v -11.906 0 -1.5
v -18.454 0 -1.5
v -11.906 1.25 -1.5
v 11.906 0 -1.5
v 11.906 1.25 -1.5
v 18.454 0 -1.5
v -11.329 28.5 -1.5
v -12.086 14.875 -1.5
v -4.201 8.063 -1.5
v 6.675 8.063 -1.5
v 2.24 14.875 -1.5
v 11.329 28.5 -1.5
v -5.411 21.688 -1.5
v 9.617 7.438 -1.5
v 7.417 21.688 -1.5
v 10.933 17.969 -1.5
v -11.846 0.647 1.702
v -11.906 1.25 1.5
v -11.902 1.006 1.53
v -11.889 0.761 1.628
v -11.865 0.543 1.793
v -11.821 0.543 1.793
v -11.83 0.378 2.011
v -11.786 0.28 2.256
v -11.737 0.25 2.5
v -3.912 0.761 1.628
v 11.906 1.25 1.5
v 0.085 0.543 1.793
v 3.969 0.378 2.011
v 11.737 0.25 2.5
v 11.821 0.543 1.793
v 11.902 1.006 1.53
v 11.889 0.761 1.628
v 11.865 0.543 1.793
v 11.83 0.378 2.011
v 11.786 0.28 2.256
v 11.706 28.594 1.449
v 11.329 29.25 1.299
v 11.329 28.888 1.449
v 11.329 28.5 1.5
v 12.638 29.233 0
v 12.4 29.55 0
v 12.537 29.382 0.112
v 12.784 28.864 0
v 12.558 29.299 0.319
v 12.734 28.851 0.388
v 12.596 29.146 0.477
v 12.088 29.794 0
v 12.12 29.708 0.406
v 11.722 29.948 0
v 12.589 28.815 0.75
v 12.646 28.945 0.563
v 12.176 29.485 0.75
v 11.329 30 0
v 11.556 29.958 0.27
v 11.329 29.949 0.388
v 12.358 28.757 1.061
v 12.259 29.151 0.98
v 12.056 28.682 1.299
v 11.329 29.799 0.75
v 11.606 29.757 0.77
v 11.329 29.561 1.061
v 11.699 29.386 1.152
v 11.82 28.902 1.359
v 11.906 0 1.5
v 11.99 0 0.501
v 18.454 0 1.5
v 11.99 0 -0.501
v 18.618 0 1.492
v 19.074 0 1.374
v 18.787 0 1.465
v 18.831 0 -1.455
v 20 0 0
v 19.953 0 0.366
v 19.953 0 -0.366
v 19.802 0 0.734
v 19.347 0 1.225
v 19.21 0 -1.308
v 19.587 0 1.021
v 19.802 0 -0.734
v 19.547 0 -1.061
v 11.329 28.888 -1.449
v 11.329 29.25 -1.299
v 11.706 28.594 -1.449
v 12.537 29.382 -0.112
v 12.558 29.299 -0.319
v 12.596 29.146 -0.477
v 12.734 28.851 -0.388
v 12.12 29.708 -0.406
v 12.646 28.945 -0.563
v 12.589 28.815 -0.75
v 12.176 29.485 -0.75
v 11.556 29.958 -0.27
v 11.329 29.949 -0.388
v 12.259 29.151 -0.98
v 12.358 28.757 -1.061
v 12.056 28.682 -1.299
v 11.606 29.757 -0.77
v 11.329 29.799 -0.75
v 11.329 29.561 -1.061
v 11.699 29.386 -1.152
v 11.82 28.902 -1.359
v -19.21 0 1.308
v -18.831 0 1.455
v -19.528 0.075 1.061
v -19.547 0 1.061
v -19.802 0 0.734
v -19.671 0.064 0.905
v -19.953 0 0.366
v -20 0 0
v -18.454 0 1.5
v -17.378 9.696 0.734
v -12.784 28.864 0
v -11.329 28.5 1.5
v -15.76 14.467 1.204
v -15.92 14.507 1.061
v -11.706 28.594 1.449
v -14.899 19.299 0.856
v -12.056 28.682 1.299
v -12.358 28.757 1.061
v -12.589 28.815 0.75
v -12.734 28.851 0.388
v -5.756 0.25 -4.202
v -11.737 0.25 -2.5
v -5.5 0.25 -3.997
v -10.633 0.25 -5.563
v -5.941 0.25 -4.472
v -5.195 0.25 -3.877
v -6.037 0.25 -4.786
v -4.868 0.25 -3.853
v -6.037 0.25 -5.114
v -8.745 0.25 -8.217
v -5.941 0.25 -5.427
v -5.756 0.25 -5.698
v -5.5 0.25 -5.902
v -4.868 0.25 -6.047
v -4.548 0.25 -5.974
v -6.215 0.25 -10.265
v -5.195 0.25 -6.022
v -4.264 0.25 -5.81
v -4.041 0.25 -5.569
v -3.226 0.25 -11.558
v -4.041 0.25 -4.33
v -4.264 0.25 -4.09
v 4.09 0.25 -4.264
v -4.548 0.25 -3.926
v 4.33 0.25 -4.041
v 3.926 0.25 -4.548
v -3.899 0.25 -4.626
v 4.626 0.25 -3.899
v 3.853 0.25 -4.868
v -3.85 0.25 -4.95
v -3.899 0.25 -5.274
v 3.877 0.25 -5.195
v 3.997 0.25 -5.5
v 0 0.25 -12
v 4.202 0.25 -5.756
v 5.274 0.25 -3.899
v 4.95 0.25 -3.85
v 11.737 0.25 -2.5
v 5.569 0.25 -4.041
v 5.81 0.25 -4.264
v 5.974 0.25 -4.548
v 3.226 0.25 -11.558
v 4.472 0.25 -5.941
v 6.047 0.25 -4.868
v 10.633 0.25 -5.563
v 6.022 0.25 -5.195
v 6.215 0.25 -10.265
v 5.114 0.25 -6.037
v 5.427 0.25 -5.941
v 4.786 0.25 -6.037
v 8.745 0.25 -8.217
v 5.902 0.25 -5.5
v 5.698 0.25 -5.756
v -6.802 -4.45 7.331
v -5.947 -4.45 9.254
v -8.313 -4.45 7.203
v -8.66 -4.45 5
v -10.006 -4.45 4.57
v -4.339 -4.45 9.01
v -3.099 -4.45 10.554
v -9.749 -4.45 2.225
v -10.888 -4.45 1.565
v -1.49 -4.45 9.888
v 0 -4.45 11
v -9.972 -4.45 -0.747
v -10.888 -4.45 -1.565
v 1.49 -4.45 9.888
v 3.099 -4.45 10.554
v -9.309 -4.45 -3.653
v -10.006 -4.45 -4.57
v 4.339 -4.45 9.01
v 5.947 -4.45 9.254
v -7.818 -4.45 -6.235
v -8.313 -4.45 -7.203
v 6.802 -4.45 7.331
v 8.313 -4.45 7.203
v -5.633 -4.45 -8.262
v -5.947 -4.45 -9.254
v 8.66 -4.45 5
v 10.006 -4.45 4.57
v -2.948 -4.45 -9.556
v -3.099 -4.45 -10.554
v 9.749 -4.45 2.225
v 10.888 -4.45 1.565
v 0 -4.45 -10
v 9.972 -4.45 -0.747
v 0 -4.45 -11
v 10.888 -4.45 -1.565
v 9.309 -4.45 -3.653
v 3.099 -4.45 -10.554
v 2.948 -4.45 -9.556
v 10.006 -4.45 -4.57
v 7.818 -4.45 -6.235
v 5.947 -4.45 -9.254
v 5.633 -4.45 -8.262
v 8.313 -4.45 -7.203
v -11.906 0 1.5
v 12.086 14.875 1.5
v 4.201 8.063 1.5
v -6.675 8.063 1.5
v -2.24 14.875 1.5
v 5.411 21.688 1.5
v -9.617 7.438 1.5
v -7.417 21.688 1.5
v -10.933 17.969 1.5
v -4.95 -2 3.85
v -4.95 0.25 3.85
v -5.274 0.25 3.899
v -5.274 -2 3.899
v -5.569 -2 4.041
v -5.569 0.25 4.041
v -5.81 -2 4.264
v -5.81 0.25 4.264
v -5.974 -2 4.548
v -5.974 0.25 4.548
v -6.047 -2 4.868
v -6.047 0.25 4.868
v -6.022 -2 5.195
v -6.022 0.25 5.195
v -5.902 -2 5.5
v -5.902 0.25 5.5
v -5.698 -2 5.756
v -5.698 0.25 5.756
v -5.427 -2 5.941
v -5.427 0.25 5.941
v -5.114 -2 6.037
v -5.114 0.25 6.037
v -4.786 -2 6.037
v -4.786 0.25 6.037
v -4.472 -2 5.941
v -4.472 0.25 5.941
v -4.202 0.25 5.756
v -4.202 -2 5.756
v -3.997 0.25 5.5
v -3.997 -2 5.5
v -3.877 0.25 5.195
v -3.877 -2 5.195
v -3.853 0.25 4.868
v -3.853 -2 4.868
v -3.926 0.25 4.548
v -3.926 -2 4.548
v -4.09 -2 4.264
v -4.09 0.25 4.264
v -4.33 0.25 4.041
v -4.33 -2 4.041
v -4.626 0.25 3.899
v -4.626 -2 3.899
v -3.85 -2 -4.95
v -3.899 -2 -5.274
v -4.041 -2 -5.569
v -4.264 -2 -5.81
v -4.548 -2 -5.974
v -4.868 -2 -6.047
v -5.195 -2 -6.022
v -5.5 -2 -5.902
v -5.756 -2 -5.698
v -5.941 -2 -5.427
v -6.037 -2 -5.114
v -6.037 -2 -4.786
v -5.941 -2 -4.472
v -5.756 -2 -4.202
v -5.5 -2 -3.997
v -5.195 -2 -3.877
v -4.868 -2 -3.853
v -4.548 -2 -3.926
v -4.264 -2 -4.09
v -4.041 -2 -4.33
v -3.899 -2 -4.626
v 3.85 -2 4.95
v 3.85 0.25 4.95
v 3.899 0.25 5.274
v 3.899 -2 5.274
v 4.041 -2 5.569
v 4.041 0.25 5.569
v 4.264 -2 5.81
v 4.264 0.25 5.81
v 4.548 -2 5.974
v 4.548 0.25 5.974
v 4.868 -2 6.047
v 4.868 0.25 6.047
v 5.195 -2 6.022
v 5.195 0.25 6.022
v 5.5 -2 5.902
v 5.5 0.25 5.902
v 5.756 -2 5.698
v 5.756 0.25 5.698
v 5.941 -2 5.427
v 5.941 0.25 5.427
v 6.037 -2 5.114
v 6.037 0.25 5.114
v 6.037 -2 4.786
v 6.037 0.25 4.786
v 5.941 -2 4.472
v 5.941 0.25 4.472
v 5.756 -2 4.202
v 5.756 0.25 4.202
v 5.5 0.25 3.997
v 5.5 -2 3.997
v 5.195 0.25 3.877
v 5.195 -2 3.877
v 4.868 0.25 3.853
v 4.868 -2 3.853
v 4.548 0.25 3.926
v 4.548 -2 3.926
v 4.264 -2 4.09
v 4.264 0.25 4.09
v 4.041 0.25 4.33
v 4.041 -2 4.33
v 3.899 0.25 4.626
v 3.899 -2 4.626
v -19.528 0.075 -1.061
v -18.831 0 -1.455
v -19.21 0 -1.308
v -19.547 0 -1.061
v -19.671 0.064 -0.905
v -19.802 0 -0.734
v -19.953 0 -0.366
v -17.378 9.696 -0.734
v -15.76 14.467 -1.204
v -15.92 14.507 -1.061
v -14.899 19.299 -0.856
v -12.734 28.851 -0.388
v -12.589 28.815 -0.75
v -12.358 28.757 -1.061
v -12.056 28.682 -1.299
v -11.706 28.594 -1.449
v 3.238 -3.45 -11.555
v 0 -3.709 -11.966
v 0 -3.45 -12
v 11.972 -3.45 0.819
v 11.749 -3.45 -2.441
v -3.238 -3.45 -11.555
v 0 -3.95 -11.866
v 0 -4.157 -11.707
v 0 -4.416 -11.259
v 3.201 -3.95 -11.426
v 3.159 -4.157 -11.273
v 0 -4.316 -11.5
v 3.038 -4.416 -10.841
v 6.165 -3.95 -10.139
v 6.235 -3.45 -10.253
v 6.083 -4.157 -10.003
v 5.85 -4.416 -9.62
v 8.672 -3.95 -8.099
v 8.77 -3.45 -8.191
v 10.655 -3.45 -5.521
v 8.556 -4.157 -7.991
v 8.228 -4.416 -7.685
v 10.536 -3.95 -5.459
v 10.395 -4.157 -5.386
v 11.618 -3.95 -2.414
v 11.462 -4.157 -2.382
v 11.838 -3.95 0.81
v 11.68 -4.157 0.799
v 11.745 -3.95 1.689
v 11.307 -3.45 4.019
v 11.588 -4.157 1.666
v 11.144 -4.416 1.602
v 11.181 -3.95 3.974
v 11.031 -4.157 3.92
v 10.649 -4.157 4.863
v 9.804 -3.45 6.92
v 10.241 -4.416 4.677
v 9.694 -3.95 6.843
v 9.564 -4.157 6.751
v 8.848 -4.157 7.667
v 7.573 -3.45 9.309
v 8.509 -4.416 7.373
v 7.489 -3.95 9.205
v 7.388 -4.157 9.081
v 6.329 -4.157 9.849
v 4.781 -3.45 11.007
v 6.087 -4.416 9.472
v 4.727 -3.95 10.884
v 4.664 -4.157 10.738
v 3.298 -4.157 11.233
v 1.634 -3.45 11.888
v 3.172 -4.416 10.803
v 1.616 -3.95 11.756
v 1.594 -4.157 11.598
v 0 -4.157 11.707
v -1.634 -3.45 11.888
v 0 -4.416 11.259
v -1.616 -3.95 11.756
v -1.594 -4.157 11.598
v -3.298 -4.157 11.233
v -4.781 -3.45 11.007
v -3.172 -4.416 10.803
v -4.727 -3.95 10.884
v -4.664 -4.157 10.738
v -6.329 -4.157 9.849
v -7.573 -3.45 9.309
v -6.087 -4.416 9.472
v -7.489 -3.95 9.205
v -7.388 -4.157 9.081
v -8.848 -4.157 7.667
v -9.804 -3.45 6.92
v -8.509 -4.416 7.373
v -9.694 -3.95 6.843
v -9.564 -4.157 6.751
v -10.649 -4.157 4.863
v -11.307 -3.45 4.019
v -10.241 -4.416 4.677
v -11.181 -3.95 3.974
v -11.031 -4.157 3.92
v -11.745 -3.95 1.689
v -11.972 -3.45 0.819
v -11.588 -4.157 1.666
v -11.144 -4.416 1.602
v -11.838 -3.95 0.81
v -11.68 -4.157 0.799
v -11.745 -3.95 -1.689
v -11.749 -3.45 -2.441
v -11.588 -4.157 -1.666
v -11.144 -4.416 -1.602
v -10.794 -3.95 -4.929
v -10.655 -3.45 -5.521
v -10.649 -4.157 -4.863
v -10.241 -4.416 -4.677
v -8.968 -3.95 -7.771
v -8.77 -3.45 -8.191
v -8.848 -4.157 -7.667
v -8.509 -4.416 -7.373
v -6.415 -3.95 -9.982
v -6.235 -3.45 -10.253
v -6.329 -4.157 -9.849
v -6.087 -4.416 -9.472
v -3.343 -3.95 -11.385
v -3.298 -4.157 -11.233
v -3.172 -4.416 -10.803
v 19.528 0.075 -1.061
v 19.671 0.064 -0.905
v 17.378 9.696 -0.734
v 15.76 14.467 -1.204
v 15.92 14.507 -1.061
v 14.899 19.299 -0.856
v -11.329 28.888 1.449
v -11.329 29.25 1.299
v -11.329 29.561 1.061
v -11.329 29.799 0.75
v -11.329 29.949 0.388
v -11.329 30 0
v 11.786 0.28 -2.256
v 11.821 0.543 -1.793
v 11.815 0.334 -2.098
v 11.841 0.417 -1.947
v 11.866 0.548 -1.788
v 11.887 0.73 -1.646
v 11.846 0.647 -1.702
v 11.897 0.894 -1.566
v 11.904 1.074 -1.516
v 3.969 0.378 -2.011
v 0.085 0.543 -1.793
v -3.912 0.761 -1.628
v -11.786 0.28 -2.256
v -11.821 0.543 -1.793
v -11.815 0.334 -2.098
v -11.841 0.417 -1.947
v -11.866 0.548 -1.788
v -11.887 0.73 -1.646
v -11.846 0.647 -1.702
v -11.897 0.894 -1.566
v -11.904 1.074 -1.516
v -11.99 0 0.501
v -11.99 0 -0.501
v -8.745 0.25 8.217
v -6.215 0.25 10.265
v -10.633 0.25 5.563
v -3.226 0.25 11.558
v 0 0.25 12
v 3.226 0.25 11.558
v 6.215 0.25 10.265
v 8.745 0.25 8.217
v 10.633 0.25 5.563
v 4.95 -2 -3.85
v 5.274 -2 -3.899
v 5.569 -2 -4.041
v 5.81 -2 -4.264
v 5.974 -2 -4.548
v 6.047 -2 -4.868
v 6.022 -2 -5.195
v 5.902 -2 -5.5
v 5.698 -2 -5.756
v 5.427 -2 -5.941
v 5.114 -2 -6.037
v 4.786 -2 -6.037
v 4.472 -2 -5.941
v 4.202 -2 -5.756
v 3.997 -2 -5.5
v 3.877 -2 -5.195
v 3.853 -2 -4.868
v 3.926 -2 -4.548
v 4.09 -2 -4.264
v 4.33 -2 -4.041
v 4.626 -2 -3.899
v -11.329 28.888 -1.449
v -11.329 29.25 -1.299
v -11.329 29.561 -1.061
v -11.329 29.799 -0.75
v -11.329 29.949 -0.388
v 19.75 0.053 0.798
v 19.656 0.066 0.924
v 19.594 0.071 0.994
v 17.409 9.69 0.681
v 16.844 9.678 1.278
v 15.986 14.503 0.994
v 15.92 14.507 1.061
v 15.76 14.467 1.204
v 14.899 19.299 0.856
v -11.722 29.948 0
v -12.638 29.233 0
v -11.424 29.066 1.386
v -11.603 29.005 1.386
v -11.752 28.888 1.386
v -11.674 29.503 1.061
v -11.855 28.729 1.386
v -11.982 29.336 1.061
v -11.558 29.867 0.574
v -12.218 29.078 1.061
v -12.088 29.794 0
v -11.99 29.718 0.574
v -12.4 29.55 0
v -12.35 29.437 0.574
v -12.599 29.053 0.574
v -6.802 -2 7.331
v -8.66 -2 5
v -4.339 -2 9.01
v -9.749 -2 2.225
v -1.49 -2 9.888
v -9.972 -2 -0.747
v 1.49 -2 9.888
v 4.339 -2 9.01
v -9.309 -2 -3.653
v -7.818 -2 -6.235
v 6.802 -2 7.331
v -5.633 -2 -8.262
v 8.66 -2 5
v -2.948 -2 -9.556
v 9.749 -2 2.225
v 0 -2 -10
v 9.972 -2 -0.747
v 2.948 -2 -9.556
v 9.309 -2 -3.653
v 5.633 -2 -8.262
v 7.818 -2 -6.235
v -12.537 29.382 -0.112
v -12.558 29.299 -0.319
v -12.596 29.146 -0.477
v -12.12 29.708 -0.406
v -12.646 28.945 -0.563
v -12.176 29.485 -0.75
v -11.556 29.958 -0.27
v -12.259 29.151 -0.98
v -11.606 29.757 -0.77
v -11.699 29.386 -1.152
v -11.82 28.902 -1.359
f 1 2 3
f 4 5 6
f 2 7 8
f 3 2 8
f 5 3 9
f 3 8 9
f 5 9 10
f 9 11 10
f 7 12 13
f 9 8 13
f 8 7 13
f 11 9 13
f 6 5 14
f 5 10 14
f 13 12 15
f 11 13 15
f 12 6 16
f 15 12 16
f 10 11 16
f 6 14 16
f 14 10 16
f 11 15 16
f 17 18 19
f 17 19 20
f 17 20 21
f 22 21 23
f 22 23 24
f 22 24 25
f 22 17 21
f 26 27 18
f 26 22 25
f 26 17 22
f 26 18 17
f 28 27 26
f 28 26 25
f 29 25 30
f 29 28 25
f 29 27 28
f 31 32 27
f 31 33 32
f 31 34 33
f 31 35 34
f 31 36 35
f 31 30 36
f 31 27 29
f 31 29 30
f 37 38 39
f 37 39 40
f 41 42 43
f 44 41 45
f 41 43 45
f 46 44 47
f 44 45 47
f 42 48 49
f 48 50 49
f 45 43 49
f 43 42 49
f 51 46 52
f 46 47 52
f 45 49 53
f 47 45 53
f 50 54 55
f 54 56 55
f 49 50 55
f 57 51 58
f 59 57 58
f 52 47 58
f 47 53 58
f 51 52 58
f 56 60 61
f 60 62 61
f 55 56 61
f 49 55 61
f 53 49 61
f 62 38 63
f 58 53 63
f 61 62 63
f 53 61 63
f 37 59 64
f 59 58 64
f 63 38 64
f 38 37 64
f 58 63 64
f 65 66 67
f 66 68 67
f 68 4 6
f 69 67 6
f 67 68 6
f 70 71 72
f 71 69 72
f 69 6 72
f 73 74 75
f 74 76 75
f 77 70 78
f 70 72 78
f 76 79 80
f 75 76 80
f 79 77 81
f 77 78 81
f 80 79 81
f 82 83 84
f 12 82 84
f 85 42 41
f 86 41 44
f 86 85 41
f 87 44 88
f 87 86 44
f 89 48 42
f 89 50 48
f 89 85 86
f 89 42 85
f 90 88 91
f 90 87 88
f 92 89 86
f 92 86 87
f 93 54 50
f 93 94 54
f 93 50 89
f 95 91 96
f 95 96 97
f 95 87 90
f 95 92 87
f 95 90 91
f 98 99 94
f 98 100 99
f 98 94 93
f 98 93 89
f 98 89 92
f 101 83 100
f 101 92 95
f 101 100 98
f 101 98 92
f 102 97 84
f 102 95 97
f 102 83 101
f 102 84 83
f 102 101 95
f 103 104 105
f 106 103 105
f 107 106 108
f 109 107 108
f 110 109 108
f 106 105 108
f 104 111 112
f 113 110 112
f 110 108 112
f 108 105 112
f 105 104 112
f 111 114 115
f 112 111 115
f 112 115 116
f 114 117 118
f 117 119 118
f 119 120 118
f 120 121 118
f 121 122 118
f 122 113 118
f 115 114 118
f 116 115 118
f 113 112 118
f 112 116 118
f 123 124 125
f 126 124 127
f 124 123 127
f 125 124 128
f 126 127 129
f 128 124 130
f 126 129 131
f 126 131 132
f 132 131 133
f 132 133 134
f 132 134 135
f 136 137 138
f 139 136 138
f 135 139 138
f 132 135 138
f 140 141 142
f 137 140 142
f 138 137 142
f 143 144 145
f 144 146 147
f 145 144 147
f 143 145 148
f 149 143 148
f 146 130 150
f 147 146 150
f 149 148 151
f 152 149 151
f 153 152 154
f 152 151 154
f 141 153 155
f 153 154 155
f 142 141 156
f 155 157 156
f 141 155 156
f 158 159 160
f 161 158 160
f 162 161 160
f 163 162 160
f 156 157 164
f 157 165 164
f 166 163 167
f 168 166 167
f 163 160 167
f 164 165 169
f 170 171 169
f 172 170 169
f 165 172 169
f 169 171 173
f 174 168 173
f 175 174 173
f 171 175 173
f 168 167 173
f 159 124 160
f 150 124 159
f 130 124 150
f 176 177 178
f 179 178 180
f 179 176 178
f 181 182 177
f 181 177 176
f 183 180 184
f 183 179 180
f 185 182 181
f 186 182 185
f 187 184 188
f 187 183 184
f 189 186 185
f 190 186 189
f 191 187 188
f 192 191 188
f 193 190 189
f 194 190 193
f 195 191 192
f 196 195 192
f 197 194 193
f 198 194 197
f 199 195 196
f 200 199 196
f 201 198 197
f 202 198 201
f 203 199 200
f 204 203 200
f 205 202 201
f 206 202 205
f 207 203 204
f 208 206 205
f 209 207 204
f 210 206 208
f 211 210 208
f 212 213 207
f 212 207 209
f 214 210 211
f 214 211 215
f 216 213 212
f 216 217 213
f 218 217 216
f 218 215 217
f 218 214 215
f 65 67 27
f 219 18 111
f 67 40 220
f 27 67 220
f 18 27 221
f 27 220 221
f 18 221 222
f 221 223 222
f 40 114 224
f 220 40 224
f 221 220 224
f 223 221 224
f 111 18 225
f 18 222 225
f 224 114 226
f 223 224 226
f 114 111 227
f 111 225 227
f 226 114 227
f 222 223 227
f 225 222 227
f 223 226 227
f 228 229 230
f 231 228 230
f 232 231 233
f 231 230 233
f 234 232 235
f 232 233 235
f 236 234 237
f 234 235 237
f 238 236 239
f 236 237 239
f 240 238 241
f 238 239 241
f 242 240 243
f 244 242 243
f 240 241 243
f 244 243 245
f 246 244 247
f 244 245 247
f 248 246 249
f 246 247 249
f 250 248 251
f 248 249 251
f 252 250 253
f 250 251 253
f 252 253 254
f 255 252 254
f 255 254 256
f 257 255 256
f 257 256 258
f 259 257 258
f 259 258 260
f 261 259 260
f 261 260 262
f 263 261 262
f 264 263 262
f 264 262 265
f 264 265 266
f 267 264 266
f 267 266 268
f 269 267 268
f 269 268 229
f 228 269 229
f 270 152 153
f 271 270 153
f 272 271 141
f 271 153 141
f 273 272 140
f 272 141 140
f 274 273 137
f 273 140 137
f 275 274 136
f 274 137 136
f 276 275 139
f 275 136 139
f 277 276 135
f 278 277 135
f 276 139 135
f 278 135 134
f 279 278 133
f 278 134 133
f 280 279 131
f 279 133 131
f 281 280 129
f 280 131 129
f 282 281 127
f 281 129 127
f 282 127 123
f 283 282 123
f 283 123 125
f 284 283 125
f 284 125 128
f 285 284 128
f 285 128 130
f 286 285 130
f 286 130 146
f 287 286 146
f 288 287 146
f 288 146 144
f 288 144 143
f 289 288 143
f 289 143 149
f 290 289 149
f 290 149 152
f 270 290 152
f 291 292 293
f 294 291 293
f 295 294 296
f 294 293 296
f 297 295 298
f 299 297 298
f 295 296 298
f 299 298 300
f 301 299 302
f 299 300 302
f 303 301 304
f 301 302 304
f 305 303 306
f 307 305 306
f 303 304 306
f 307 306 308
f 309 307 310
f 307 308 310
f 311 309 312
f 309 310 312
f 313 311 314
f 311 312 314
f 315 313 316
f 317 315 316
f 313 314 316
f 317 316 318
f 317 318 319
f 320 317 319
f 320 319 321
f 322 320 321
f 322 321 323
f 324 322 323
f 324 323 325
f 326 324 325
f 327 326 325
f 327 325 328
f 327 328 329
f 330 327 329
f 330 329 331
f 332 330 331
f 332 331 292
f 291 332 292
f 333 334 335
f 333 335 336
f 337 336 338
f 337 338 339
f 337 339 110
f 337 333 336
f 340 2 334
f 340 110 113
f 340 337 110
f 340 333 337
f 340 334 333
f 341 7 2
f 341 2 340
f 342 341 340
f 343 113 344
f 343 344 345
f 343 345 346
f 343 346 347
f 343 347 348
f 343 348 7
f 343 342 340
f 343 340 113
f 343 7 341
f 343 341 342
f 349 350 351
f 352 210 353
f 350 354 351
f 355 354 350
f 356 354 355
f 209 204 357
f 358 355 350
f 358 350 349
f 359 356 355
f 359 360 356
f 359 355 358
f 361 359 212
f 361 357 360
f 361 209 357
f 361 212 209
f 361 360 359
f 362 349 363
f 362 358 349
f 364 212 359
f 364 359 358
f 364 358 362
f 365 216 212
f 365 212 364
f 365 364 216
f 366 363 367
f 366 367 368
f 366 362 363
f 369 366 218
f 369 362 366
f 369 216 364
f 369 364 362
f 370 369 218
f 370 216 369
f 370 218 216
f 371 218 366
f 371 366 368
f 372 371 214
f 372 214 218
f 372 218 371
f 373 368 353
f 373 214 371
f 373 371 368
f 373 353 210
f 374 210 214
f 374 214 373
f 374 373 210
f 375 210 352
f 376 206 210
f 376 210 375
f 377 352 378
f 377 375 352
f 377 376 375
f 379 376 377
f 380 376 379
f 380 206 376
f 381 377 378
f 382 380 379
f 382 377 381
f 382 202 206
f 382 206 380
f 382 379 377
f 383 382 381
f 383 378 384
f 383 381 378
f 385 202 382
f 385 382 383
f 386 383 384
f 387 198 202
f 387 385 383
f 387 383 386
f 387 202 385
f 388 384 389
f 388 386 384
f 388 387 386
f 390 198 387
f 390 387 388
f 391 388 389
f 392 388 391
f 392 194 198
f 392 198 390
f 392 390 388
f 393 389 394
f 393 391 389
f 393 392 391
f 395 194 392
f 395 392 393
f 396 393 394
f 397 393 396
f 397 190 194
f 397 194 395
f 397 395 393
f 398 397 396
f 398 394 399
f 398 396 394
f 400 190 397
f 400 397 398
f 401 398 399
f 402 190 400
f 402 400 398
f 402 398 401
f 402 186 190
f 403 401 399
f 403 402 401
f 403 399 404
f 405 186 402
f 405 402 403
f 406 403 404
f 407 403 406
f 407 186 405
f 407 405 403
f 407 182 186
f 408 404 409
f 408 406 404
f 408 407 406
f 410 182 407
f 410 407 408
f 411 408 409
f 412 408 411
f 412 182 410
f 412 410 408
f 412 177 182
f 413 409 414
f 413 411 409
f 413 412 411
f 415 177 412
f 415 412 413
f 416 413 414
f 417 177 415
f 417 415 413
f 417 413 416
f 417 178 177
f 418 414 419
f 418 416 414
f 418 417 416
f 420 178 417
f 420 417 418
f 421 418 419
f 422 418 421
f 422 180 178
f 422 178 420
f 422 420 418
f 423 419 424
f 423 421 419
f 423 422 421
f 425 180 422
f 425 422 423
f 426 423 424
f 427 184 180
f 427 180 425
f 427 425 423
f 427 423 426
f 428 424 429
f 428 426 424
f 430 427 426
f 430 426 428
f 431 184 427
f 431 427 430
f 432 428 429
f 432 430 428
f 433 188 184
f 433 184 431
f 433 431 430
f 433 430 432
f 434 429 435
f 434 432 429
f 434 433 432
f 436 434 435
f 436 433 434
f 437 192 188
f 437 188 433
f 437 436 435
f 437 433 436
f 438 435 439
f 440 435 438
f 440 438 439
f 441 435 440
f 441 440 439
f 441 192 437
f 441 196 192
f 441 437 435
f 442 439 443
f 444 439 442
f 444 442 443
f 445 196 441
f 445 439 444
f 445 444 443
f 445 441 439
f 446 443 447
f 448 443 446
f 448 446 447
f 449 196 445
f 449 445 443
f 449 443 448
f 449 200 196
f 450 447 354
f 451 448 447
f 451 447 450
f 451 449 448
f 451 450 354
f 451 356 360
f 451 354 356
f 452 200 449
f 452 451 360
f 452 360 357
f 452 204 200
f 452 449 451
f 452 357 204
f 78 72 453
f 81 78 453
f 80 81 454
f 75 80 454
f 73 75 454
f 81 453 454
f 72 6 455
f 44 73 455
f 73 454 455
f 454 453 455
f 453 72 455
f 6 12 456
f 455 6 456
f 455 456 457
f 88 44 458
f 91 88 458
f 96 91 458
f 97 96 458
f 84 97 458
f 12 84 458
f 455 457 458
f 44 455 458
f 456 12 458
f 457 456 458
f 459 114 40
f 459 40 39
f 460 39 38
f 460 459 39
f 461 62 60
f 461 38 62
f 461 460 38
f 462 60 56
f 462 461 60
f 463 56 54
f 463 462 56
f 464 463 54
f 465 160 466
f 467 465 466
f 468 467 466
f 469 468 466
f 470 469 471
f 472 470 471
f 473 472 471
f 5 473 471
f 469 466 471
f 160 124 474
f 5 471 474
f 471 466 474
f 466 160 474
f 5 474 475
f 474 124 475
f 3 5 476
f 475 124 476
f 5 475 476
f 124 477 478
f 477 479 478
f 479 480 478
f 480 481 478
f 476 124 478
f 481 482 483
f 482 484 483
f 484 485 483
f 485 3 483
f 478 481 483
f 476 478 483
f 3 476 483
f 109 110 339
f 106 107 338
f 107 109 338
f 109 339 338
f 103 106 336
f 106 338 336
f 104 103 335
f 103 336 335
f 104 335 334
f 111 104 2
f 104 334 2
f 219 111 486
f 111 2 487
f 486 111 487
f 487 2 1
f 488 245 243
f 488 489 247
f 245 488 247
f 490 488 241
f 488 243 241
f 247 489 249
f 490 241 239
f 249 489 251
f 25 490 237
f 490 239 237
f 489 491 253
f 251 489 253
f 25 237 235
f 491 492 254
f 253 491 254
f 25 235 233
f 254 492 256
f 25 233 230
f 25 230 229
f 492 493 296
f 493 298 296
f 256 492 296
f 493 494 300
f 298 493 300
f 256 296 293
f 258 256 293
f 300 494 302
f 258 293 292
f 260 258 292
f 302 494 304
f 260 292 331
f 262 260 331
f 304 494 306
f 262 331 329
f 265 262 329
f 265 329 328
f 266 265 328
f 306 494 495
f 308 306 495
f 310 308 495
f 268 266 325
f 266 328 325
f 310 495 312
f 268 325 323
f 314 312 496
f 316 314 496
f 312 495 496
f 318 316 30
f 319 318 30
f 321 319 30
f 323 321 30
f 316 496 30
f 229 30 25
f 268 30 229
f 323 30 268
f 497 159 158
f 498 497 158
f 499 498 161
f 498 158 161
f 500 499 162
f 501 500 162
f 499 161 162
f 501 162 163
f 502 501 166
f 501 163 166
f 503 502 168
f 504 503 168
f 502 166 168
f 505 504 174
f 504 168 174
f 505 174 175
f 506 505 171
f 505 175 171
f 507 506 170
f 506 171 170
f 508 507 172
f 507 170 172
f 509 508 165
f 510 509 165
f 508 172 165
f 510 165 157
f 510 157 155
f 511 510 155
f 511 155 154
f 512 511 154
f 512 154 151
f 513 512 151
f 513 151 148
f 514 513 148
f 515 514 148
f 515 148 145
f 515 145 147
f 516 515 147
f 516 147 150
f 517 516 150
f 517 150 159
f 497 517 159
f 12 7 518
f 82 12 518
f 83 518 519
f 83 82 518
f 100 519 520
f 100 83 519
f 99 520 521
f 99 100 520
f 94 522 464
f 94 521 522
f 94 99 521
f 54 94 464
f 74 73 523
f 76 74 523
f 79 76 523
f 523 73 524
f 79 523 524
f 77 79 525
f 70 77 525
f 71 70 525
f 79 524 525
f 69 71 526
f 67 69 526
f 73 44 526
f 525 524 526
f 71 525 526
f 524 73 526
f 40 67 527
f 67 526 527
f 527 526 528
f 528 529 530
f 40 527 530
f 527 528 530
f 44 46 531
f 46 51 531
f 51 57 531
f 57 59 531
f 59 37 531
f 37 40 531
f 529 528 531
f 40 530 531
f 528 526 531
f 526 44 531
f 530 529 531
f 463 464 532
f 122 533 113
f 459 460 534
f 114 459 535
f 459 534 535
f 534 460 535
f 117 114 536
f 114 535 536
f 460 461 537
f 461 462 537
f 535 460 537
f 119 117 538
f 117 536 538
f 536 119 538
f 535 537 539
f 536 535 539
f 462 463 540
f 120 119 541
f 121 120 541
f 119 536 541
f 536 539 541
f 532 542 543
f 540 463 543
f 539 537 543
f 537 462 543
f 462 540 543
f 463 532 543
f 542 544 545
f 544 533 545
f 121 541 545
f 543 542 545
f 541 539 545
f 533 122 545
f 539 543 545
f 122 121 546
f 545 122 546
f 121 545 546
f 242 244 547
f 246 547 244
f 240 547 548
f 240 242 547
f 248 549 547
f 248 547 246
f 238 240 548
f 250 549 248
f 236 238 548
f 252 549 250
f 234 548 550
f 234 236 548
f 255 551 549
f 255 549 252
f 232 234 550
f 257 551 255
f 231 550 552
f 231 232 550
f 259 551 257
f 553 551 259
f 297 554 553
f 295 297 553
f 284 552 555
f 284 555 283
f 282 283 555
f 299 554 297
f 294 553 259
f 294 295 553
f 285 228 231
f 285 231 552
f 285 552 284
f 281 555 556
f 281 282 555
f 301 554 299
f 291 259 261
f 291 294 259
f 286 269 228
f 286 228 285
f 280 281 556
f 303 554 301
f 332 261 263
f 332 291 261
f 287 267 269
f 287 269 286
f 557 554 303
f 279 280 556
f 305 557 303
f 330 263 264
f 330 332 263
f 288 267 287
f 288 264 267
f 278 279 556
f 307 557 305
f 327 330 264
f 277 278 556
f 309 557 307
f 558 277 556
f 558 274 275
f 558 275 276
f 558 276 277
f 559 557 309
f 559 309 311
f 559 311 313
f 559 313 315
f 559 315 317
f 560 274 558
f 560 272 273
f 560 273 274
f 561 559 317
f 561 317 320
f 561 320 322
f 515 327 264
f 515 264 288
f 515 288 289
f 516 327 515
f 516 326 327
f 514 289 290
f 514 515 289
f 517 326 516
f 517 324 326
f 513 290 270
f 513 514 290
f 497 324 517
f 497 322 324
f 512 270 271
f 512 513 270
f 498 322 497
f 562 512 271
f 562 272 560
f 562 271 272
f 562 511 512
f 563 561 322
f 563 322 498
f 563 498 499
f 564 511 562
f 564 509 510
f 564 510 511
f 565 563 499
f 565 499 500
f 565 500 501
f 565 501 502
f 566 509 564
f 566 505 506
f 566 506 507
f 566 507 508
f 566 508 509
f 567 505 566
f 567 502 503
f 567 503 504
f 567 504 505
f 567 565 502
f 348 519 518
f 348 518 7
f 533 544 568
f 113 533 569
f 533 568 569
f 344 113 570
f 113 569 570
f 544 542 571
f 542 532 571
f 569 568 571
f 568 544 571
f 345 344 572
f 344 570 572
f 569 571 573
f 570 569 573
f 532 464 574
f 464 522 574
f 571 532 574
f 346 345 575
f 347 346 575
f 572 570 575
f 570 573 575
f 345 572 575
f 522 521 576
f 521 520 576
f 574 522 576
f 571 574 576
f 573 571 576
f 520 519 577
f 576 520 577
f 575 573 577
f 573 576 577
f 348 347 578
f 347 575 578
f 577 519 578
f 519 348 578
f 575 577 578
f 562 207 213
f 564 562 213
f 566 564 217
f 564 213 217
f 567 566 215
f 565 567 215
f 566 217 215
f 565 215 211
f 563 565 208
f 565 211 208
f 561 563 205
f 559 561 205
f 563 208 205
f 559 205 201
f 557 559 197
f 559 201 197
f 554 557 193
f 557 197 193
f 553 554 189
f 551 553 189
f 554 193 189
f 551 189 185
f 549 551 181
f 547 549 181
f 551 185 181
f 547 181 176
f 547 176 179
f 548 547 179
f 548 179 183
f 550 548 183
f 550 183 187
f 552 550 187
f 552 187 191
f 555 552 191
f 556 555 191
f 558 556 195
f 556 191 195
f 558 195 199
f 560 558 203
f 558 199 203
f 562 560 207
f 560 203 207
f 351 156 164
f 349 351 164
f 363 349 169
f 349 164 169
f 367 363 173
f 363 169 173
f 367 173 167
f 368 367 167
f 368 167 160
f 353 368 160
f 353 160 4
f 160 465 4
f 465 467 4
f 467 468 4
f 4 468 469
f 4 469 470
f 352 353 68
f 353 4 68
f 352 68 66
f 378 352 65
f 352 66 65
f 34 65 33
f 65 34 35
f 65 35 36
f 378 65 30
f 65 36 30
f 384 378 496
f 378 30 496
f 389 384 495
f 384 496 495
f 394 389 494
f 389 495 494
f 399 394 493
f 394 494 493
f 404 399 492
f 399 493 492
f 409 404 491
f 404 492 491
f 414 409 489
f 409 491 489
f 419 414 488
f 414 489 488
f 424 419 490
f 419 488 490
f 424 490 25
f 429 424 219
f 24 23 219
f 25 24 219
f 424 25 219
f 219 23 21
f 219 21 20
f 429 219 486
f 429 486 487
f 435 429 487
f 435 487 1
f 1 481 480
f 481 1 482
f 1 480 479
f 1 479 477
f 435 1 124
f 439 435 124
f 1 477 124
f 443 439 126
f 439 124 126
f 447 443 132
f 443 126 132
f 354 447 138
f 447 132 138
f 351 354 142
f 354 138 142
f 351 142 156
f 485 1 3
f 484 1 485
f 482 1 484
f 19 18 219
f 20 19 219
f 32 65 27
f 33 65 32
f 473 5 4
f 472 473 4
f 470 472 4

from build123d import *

# Parameters (mm, degrees)
FILLET1_R                = 1.5
BOSS_EXTRUDE1_DEPTH      = 4.45
BOSS_EXTRUDE1_DEPTH_BACK = 0.25
SKETCH3_R                = 12
FILLET2_R                = 1
SKETCH4_R                = 10
CUT_EXTRUDE1_DEPTH       = 2.45
SKETCH8_R                = 1.1
CUT_EXTRUDE2_DEPTH       = 38.80294317
CIRPATTERN1_COUNT        = 4


with BuildPart() as part:
    # Sketch1 → Loft1 section 0
    with BuildSketch(Plane(origin=(0, 0, 0), x_dir=(1, 0, 0), z_dir=(0, 1, 0))):
        with BuildLine():
            Line((-20, 1.5), (20, 1.5))
            Line((20, 1.5), (20, -1.5))
            Line((20, -1.5), (-20, -1.5))
            Line((-20, -1.5), (-20, 1.5))
        make_face()
    # Sketch2 → Loft1 section 1
    with BuildSketch(Plane(origin=(0, 30, 0), x_dir=(1, 0, 0), z_dir=(0, 1, 0))):
        with BuildLine():
            Line((-12.5, 1.5), (12.5, 1.5))
            Line((12.5, 1.5), (12.5, -1.5))
            Line((12.5, -1.5), (-12.5, -1.5))
            Line((-12.5, -1.5), (-12.5, 1.5))
        make_face()
    loft()

    # Fillet1
    fillet1_edges = [part.edges().sort_by_distance(p)[0] for p in [
        (0, 30, -1.5),
        (-12.5, 30, 0),
        (0, 30, 1.5),
        (12.5, 30, 0),
        (16.25, 15, 1.5),
        (-16.25, 15, 1.5),
        (16.25, 15, -1.5),
        (-16.25, 15, -1.5),
    ]]
    fillet(fillet1_edges, radius=FILLET1_R - 0.0001)  # a hair under: the kernel refuses the full size

    # Sketch3 → Boss-Extrude1 (add, two sides: drawn at the far end of the back side and taken through both)
    with BuildSketch(Plane.XZ.offset(-BOSS_EXTRUDE1_DEPTH_BACK)):
        with Locations(Location((0, 0, 0), (0, 0, 270))):
            Circle(SKETCH3_R)
    extrude(amount=BOSS_EXTRUDE1_DEPTH + BOSS_EXTRUDE1_DEPTH_BACK)

    # Fillet2
    fillet2_edges = [part.edges().sort_by_distance(p)[0] for p in [
        (0, 0.25, 1.5),
        (0, 0.25, -1.5),
        (0, -4.45, 12),
    ]]
    fillet(fillet2_edges, radius=FILLET2_R)

    # Sketch4 → Cut-Extrude1 (cut)
    with BuildSketch(Plane.XZ.offset(4.45)):
        with Locations(Location((0, 0, 0), (0, 0, 270))):
            Circle(SKETCH4_R)
    extrude(amount=-CUT_EXTRUDE1_DEPTH, mode=Mode.SUBTRACT)

    # Sketch8 → Cut-Extrude2 (cut, through all)
    with BuildSketch(Plane(origin=(0, 0.25, 0), x_dir=(1, 0, 0), z_dir=(0, 1, 0))):
        with Locations(Location((4.949747468, 4.949747468, 0), (0, 0, 270))):
            Circle(SKETCH8_R)
    cut_extrude2 = extrude(amount=-CUT_EXTRUDE2_DEPTH, mode=Mode.SUBTRACT)

    # CirPattern1: Cut-Extrude2 ×4 about axis
    cirpattern1_axis = Axis((0, 0, 0), (0, 1, 0))
    for i in range(1, CIRPATTERN1_COUNT):
        add(cut_extrude2.rotate(cirpattern1_axis, i * 360 / CIRPATTERN1_COUNT), mode=Mode.SUBTRACT)


solid = part.part
